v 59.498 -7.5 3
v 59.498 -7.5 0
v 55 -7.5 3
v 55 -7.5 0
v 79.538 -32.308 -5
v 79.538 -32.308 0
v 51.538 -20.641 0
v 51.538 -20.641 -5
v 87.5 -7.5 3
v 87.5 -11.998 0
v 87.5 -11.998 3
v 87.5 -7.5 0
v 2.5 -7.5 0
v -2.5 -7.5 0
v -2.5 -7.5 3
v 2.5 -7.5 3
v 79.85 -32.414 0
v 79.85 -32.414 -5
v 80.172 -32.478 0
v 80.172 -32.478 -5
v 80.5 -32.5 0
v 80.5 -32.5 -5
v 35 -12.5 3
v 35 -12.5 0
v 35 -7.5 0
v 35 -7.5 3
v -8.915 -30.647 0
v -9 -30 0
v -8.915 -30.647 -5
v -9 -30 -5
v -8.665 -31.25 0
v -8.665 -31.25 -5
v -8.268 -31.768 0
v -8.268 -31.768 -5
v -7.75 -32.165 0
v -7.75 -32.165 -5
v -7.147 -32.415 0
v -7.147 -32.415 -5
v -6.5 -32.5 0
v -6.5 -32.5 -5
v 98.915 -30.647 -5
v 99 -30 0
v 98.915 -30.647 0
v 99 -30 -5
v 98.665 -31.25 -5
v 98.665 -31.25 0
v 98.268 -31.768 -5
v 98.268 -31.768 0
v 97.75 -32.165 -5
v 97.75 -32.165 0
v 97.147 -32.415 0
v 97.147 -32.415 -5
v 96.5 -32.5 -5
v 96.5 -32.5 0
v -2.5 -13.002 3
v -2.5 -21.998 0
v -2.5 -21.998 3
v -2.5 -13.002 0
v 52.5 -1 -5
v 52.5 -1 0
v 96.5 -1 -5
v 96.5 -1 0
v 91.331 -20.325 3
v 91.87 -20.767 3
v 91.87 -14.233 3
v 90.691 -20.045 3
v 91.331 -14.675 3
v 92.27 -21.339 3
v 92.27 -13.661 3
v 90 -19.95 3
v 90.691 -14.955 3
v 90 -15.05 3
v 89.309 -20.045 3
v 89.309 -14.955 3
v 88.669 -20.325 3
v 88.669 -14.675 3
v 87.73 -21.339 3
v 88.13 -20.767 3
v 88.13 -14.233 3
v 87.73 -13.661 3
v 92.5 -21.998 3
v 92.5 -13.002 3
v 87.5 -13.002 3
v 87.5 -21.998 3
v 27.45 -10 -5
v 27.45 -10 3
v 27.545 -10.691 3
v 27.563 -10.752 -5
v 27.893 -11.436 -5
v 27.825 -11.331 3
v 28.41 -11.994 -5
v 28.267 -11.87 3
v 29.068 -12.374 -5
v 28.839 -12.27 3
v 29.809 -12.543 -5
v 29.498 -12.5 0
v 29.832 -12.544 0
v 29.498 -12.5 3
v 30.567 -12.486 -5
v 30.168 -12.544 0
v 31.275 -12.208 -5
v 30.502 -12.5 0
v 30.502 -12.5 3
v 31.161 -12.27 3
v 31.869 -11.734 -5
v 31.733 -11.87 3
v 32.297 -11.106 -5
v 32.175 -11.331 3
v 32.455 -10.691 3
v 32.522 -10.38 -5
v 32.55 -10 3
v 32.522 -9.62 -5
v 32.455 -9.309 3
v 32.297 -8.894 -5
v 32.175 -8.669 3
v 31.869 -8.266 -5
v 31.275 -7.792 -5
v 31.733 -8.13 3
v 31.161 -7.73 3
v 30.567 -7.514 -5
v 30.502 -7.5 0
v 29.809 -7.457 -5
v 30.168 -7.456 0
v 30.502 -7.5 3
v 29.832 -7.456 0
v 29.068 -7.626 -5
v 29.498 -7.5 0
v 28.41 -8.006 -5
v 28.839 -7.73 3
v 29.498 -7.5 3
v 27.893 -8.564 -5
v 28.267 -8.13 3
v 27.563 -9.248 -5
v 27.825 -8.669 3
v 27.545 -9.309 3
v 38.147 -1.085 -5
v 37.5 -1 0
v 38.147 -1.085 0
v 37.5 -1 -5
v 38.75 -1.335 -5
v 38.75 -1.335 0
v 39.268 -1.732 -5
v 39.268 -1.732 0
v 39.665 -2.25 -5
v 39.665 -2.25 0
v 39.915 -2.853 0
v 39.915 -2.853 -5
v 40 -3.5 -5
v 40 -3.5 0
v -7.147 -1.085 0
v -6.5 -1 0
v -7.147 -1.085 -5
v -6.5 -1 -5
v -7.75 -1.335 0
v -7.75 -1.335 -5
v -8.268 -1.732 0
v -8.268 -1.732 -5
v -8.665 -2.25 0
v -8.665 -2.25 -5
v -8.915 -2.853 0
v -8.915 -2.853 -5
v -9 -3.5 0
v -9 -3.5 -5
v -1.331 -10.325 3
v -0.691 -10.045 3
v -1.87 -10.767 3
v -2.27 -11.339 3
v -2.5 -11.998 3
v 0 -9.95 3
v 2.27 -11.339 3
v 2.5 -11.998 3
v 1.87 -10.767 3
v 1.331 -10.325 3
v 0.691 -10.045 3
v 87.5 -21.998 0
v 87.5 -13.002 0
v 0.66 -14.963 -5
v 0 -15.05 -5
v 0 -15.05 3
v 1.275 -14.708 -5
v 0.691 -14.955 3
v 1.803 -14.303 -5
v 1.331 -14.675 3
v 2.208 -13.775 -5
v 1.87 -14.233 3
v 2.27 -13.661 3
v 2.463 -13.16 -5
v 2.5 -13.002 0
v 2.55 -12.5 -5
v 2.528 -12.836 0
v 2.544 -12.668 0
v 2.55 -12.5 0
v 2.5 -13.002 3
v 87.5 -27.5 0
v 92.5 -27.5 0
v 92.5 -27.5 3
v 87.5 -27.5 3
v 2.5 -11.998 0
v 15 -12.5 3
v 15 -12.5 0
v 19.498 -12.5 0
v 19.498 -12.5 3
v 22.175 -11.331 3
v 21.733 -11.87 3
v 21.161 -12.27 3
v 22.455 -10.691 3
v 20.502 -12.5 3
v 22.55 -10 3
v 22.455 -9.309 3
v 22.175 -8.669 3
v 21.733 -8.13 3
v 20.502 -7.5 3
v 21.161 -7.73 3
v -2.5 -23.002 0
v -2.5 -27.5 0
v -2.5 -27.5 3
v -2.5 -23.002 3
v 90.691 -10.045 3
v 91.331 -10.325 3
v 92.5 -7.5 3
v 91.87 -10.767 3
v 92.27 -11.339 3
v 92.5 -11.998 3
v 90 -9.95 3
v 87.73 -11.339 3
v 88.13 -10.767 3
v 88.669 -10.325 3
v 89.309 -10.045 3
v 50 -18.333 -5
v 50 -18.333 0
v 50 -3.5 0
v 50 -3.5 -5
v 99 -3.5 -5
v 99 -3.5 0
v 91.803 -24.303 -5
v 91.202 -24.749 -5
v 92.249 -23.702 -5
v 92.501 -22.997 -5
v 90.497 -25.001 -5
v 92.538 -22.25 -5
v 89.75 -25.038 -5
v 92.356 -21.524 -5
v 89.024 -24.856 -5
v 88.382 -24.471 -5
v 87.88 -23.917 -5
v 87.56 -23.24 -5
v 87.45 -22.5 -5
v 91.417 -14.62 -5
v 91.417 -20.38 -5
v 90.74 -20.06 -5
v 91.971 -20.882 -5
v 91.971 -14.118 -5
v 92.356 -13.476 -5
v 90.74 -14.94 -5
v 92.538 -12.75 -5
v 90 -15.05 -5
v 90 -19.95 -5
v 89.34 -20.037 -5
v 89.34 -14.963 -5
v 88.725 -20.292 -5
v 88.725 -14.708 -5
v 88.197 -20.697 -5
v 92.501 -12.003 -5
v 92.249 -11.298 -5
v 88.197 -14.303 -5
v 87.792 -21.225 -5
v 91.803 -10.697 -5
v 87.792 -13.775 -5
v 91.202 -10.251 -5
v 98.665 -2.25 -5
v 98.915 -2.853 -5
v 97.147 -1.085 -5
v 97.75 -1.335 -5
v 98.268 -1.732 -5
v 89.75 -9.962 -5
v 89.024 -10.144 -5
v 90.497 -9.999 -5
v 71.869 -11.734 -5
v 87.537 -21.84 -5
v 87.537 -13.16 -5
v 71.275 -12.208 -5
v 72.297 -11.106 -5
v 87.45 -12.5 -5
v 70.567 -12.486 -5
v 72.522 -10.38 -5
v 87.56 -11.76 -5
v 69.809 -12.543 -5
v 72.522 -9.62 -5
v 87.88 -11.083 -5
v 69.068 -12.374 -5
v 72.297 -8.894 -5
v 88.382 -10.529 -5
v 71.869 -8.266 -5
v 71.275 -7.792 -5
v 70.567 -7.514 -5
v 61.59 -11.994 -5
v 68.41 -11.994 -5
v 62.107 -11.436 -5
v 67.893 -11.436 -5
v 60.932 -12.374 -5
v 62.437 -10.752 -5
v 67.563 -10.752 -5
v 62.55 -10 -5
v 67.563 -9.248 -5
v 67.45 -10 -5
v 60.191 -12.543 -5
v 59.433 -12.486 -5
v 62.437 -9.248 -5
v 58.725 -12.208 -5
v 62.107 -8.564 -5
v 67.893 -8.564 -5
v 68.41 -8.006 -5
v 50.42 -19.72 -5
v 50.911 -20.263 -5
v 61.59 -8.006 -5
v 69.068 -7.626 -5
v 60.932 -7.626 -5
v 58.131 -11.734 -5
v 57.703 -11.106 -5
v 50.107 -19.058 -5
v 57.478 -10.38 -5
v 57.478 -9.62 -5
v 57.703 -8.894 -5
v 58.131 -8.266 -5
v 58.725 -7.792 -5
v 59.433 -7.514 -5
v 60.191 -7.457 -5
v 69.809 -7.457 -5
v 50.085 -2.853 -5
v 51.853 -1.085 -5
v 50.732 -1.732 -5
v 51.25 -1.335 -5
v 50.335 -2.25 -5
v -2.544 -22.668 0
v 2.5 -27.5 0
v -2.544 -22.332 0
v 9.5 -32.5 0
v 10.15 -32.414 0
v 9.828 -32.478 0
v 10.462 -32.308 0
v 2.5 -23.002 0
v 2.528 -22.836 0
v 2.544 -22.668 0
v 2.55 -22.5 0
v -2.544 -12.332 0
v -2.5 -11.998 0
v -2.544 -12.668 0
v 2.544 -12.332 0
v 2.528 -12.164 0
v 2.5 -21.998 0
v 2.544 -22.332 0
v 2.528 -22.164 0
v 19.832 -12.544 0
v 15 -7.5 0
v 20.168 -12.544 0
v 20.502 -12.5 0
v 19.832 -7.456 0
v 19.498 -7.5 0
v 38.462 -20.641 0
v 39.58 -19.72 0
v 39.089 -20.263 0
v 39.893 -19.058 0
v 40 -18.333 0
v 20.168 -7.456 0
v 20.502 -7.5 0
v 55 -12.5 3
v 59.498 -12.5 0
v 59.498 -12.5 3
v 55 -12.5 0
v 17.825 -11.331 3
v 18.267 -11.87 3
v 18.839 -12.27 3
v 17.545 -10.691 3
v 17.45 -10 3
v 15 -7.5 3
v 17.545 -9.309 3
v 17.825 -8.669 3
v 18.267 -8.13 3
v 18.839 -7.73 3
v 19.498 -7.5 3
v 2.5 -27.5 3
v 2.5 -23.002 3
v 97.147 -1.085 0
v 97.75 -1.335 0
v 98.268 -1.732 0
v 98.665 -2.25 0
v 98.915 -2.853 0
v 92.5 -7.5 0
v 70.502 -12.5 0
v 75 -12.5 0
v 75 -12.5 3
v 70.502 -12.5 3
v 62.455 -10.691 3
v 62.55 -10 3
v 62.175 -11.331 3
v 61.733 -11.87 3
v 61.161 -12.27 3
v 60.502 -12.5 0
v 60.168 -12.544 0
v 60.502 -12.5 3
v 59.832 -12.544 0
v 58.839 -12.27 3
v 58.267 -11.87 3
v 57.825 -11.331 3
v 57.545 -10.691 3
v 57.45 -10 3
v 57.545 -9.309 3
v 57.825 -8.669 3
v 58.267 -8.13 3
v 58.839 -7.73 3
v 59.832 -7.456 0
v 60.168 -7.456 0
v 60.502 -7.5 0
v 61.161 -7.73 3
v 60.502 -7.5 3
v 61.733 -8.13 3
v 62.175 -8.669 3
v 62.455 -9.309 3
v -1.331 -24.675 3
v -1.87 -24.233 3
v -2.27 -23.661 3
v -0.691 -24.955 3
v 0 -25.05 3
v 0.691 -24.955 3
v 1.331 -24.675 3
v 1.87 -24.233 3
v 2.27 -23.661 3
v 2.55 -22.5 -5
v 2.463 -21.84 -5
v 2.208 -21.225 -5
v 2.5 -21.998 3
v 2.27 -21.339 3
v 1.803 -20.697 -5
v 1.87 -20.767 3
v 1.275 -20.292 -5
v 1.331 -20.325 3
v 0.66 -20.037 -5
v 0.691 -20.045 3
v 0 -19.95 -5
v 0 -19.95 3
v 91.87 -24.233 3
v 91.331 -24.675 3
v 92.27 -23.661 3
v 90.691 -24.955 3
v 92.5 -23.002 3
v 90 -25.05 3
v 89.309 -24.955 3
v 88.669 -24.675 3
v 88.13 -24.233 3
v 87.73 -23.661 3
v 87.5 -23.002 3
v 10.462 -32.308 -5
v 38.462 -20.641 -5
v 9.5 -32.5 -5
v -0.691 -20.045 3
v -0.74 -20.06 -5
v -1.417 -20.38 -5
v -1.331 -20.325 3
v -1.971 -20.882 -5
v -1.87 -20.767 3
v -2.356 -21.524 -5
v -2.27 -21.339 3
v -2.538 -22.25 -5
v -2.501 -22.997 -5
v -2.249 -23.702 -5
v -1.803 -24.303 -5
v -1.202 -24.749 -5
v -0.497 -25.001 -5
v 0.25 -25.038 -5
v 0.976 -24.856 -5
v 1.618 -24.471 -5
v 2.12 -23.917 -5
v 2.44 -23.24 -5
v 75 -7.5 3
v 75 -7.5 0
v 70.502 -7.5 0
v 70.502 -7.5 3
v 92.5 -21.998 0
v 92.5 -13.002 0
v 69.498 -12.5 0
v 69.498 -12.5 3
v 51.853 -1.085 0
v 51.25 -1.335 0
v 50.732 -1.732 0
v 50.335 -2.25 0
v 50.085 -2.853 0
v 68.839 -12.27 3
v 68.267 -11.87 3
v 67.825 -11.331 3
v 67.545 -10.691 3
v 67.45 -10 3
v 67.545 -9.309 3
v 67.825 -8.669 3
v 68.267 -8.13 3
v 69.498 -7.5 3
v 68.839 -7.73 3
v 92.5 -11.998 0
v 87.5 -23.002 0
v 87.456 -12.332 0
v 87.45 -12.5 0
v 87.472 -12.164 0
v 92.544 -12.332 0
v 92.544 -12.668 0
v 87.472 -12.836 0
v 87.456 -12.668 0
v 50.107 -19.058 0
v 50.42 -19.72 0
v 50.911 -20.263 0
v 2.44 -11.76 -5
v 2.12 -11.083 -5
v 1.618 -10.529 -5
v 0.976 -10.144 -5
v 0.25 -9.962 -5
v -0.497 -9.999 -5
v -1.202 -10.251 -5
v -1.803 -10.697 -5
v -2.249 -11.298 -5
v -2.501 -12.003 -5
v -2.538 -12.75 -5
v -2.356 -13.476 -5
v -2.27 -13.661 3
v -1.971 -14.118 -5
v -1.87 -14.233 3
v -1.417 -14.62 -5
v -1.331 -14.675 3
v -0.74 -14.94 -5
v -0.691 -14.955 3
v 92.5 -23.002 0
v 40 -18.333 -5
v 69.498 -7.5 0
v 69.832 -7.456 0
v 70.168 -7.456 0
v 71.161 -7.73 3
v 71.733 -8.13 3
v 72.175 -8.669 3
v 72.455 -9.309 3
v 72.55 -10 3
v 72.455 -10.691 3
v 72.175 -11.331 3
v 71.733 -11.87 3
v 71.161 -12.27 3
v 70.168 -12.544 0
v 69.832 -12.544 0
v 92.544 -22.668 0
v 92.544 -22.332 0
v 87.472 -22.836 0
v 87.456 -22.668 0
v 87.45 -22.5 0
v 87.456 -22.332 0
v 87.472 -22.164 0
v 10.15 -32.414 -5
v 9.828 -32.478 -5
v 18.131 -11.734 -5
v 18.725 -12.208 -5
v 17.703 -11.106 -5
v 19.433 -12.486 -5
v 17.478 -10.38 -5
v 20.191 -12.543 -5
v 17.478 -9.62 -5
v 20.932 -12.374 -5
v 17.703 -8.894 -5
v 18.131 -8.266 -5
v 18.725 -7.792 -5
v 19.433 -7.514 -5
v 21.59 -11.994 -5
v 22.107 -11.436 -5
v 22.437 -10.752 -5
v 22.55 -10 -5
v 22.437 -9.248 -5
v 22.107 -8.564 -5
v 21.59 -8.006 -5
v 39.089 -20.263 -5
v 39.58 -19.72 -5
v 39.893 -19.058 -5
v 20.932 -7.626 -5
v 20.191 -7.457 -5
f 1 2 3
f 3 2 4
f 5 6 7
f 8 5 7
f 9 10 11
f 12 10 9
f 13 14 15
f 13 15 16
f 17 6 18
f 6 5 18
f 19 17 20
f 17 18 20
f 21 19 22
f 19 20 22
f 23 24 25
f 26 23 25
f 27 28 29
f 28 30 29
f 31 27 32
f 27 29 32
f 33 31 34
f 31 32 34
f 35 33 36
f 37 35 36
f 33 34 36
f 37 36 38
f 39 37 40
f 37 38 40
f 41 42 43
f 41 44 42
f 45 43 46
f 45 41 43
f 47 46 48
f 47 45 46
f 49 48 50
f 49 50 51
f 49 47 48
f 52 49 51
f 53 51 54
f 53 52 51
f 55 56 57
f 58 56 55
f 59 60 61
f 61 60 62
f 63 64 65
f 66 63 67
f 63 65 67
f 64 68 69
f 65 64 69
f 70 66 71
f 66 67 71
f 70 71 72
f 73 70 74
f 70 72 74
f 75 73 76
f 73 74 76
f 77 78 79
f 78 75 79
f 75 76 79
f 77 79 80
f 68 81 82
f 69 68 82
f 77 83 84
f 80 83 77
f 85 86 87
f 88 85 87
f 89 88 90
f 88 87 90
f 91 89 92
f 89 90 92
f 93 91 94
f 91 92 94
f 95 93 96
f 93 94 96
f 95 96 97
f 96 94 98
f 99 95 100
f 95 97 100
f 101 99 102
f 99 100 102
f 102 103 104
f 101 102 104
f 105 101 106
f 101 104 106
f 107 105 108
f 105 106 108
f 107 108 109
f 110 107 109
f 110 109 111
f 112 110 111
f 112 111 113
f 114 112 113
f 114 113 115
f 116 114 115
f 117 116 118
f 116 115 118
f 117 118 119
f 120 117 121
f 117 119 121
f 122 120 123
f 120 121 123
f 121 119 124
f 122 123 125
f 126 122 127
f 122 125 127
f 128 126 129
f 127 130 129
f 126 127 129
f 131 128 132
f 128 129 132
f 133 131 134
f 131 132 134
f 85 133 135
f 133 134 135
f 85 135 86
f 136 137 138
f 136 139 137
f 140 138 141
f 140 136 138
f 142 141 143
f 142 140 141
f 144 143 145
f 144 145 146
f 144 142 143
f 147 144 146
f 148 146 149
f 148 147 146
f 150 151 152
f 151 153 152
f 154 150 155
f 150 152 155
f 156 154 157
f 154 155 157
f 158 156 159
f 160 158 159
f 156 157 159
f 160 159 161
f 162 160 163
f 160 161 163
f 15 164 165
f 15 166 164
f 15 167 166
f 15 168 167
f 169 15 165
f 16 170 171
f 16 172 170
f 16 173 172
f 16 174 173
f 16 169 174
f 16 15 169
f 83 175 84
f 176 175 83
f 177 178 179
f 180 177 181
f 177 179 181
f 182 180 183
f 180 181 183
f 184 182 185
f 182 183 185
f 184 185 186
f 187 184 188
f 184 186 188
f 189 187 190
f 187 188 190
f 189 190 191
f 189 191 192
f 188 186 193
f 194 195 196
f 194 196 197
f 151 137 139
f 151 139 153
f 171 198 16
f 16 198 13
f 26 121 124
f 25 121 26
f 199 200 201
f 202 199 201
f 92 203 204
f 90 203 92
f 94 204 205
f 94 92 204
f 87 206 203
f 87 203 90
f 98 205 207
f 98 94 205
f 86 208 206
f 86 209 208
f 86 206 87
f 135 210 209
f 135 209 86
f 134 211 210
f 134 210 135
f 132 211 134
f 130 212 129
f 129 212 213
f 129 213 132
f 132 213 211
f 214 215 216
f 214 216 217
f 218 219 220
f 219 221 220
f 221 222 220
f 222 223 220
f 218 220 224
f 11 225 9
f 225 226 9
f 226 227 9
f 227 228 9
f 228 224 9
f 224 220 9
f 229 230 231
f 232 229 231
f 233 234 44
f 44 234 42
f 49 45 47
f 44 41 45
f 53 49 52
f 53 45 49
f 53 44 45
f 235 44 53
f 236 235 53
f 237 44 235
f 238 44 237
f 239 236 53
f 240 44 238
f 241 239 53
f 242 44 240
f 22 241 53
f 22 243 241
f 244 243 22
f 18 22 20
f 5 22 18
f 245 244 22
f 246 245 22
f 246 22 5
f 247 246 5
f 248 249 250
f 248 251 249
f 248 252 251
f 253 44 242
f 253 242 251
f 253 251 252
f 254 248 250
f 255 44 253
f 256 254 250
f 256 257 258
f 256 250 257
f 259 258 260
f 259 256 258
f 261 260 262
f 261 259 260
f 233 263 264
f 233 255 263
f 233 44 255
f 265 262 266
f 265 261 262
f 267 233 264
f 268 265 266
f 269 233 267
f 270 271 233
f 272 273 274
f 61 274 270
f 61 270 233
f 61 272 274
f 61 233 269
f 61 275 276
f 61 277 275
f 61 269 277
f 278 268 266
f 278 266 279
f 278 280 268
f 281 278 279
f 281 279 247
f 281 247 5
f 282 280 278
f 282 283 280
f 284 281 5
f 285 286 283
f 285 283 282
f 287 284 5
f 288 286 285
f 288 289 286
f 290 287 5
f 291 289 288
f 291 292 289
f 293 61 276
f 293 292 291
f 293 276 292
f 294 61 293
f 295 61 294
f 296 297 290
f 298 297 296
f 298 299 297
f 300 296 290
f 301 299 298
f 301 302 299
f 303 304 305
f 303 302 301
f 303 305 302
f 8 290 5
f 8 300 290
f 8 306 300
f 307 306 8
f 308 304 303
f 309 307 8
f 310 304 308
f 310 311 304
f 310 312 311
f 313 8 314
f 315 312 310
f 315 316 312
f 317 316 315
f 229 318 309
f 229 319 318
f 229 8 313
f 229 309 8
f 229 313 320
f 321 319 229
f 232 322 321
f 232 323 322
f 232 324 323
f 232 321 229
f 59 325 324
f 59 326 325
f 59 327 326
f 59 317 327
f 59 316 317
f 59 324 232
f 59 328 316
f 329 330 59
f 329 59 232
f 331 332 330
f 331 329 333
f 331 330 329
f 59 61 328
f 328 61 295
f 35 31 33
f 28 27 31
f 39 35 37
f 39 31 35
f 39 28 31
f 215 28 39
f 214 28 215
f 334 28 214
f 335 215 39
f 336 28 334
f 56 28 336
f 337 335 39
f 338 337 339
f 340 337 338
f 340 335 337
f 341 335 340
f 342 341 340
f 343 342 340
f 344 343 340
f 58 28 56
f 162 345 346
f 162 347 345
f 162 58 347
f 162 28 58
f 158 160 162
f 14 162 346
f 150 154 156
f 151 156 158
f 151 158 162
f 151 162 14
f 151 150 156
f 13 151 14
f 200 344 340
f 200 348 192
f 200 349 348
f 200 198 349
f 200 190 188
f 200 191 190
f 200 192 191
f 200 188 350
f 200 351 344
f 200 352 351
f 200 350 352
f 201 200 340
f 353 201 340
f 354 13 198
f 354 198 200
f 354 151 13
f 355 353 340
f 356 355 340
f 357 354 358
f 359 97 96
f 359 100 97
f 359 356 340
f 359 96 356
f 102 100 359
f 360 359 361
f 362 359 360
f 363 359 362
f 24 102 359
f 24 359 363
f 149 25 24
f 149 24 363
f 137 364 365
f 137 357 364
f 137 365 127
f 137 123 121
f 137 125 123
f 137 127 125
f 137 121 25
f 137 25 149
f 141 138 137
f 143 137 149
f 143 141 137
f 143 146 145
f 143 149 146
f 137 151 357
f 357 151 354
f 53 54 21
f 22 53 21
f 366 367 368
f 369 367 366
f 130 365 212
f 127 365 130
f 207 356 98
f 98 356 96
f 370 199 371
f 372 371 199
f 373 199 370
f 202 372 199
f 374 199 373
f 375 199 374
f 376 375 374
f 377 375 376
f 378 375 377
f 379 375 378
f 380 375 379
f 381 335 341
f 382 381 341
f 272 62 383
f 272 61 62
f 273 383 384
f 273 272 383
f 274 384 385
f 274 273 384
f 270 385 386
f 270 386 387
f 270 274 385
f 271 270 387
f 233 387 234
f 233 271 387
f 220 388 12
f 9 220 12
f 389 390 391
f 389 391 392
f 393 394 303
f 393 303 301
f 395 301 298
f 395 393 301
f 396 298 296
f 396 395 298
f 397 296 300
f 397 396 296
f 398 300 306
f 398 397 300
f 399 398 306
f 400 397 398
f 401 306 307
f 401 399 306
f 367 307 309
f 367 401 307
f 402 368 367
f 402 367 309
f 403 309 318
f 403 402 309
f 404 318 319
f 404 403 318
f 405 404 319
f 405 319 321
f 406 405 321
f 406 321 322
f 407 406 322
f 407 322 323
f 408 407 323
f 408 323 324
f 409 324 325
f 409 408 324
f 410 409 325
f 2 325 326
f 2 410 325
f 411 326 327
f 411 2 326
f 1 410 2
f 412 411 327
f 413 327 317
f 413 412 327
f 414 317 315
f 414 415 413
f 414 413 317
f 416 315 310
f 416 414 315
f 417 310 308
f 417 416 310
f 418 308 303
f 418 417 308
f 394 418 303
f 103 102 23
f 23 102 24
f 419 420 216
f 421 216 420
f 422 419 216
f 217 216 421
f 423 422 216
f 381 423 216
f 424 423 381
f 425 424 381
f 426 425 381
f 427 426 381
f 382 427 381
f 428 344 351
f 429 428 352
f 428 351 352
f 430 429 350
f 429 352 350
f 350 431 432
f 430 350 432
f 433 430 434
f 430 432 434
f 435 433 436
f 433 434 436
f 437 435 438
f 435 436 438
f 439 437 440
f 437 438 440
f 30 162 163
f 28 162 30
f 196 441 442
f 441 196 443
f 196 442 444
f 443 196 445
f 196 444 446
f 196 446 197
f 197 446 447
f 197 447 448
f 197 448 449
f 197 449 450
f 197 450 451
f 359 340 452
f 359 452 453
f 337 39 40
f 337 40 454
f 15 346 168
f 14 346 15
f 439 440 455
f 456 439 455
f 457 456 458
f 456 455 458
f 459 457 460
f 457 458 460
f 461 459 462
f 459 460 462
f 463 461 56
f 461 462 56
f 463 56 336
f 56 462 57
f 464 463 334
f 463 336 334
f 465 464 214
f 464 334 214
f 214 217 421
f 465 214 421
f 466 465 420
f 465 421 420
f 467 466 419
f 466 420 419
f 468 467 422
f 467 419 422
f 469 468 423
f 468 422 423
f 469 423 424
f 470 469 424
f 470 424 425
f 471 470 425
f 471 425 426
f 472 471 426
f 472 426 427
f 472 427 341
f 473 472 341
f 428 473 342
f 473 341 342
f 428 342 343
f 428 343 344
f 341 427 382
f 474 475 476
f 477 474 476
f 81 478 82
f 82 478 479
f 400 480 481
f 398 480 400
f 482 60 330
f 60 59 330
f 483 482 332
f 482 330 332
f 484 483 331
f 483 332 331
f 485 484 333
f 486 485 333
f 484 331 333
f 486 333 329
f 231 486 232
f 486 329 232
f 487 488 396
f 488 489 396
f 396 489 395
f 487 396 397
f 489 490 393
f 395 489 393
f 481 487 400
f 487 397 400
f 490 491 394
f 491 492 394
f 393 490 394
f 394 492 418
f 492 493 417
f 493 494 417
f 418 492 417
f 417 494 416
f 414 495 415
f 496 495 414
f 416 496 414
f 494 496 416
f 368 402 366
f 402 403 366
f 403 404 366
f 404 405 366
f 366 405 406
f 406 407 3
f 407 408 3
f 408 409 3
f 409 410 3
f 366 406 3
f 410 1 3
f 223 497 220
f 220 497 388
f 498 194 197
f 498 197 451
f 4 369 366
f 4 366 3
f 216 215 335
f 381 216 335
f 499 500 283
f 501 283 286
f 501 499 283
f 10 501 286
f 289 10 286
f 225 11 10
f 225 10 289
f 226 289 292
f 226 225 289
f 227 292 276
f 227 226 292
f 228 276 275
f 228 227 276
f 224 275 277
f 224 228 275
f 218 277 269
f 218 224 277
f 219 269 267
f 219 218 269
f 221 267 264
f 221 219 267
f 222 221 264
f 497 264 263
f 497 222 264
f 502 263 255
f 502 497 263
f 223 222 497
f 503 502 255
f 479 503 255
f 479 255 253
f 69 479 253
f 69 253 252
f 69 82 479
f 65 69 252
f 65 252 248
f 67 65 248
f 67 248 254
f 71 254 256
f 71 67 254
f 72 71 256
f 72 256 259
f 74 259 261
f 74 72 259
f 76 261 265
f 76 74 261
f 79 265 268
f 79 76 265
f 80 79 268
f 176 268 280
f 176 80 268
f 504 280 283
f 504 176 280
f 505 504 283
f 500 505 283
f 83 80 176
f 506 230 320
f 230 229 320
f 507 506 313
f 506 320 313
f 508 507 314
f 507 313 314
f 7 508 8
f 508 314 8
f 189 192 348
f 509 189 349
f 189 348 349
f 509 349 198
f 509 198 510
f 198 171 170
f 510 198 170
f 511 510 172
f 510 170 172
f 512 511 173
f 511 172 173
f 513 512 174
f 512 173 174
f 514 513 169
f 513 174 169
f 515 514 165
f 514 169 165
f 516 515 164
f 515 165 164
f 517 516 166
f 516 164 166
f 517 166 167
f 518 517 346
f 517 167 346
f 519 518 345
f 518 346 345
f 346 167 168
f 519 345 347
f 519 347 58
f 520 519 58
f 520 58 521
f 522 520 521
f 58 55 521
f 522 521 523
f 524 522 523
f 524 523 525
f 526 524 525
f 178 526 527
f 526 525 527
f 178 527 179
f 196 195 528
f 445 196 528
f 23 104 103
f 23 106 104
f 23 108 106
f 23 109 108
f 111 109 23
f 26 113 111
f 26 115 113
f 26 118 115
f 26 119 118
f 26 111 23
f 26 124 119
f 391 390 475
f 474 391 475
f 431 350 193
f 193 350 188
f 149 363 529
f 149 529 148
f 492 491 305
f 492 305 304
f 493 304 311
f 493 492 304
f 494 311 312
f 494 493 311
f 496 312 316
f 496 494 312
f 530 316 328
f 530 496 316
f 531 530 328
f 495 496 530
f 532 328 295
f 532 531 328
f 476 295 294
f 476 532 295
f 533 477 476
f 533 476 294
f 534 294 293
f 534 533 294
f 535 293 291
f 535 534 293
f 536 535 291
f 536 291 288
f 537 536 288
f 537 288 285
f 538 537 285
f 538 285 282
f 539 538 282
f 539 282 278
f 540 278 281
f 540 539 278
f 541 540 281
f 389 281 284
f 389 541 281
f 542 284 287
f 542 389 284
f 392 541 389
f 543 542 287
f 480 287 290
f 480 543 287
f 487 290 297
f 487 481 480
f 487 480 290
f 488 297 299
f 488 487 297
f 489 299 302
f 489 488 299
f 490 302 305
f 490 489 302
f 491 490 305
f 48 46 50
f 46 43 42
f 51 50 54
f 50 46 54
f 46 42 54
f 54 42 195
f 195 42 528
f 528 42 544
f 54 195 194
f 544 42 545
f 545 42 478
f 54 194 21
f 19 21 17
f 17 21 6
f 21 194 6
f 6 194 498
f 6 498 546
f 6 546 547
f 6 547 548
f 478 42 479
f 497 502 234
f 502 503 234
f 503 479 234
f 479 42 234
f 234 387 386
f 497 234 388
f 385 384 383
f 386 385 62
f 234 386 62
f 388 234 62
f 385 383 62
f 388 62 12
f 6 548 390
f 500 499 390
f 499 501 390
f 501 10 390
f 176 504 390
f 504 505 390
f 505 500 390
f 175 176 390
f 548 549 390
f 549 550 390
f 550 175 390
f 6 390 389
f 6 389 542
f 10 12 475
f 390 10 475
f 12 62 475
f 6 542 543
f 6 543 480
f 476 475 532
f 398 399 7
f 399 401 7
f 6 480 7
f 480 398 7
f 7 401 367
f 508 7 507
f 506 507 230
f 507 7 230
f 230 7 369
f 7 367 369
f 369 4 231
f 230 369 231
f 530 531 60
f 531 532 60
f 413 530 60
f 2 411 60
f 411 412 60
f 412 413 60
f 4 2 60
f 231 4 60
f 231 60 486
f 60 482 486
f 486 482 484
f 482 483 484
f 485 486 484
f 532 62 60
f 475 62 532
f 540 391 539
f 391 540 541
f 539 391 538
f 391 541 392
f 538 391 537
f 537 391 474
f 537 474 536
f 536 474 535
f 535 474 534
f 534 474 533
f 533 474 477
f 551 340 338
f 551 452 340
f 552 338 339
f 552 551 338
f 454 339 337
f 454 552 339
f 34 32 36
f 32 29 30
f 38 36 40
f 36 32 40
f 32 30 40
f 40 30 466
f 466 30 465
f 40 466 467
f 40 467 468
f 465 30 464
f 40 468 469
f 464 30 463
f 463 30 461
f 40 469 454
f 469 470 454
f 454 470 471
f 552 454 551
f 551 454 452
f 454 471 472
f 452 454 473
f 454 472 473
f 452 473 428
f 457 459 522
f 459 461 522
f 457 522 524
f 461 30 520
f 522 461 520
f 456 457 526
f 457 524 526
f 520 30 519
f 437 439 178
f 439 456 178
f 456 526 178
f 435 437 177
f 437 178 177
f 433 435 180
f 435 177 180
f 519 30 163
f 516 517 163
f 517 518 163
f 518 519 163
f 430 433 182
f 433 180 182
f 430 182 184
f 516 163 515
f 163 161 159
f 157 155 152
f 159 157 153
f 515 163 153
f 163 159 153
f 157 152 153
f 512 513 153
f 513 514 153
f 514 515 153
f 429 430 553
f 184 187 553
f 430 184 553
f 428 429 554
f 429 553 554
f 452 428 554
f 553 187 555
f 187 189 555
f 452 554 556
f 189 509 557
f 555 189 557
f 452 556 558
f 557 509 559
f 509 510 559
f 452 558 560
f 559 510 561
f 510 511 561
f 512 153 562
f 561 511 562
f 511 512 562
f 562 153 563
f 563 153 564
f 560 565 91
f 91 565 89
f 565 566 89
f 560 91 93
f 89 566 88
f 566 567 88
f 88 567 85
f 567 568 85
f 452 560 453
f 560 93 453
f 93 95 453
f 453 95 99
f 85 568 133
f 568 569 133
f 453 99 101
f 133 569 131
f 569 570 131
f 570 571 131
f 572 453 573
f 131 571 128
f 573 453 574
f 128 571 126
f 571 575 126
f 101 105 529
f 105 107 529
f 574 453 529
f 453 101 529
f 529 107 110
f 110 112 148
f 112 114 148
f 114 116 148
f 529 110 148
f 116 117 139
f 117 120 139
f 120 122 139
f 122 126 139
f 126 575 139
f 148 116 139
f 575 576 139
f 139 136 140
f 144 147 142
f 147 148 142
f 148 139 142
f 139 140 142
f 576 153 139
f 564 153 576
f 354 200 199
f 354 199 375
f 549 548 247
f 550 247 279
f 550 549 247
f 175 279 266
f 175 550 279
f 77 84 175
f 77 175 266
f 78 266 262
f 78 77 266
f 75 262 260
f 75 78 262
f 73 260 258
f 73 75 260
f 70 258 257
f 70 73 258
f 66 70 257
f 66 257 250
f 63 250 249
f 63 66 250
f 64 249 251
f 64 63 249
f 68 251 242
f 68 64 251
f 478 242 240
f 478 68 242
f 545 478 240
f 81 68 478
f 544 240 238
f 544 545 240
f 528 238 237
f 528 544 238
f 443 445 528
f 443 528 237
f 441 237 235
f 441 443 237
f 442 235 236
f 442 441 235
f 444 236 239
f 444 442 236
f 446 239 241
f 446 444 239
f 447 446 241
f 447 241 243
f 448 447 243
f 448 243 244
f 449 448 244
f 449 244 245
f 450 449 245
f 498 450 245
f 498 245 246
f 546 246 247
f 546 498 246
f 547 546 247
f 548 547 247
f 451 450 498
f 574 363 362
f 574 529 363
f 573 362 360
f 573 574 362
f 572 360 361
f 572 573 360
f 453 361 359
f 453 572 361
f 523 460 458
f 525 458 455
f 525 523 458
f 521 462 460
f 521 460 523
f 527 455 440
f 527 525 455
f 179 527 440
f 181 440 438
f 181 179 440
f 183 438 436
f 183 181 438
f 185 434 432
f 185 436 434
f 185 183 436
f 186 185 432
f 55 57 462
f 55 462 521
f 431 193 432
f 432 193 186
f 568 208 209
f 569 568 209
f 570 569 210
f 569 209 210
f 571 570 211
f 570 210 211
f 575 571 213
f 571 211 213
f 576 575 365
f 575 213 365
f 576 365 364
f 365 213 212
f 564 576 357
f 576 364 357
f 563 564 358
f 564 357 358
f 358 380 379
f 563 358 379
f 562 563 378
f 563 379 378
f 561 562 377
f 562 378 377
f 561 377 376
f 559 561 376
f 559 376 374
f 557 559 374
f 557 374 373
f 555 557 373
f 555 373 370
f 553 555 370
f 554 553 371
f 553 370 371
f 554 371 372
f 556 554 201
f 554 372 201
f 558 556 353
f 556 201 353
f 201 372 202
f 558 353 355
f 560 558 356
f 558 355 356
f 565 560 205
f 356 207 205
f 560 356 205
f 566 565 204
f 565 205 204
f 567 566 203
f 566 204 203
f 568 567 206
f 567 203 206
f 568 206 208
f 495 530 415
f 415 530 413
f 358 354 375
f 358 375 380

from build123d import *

# Parameters (mm, degrees)
F1_DEPTH = 5
F2_W     = 5
F2_H     = 20
F2_W_2   = 20
F2_H_2   = 5
F3_DEPTH = 3
F4_R     = 2.55
F5_DEPTH = 10
F6_R     = 2.5


with BuildPart() as f1:
    # F0 (on Top) → F1 (new body)
    with BuildSketch(Plane.XY):
        Polygon((40, -1), (-9, -1), (-9, -32.5), (10, -32.5), (40, -20), align=None)
    extrude(amount=-F1_DEPTH)

    # F2 (on Top) → F3 (join)
    with BuildSketch(Plane.XY):
        with Locations((0, -17.5)):
            Rectangle(F2_W, F2_H)
        with Locations((25, -10)):
            Rectangle(F2_W_2, F2_H_2)
    extrude(amount=F3_DEPTH)

    # F4 (on face) → F5 (cut)
    with BuildSketch(Plane.XY.offset(3)):
        with BuildLine():
            ThreePointArc((0, -15.05), (1.803122, -14.303122), (2.55, -12.5))
            ThreePointArc((2.55, -12.5), (-1.803122, -10.696878), (0, -15.05))
        make_face()
        with BuildLine():
            ThreePointArc((2.55, -22.5), (1.803122, -20.696878), (0, -19.95))
            ThreePointArc((0, -19.95), (-1.803122, -24.303122), (2.55, -22.5))
        make_face()
        with Locations((20, -10)):
            Circle(F4_R)
        with BuildLine():
            ThreePointArc((32.55, -10), (30, -7.45), (27.45, -10))
            ThreePointArc((27.45, -10), (30, -12.55), (32.55, -10))
        make_face()
    extrude(amount=-F5_DEPTH, mode=Mode.SUBTRACT)

    # F6
    f6_edges = [f1.edges().sort_by_distance(p)[0] for p in [
        (-9, -1, -2.5),
        (-9, -32.5, -2.5),
        (10, -32.5, -2.5),
        (40, -20, -2.5),
        (40, -1, -2.5),
    ]]
    fillet(f6_edges, radius=F6_R)


with BuildPart() as f8_1:
    # F8: instance of F1
    add(f1.part.mirror(Plane(origin=(45, -10.916667, -2.5), x_dir=(0, 1, 0), z_dir=(1, 0, 0))))


solid = Compound([f1.part, f8_1.part])
